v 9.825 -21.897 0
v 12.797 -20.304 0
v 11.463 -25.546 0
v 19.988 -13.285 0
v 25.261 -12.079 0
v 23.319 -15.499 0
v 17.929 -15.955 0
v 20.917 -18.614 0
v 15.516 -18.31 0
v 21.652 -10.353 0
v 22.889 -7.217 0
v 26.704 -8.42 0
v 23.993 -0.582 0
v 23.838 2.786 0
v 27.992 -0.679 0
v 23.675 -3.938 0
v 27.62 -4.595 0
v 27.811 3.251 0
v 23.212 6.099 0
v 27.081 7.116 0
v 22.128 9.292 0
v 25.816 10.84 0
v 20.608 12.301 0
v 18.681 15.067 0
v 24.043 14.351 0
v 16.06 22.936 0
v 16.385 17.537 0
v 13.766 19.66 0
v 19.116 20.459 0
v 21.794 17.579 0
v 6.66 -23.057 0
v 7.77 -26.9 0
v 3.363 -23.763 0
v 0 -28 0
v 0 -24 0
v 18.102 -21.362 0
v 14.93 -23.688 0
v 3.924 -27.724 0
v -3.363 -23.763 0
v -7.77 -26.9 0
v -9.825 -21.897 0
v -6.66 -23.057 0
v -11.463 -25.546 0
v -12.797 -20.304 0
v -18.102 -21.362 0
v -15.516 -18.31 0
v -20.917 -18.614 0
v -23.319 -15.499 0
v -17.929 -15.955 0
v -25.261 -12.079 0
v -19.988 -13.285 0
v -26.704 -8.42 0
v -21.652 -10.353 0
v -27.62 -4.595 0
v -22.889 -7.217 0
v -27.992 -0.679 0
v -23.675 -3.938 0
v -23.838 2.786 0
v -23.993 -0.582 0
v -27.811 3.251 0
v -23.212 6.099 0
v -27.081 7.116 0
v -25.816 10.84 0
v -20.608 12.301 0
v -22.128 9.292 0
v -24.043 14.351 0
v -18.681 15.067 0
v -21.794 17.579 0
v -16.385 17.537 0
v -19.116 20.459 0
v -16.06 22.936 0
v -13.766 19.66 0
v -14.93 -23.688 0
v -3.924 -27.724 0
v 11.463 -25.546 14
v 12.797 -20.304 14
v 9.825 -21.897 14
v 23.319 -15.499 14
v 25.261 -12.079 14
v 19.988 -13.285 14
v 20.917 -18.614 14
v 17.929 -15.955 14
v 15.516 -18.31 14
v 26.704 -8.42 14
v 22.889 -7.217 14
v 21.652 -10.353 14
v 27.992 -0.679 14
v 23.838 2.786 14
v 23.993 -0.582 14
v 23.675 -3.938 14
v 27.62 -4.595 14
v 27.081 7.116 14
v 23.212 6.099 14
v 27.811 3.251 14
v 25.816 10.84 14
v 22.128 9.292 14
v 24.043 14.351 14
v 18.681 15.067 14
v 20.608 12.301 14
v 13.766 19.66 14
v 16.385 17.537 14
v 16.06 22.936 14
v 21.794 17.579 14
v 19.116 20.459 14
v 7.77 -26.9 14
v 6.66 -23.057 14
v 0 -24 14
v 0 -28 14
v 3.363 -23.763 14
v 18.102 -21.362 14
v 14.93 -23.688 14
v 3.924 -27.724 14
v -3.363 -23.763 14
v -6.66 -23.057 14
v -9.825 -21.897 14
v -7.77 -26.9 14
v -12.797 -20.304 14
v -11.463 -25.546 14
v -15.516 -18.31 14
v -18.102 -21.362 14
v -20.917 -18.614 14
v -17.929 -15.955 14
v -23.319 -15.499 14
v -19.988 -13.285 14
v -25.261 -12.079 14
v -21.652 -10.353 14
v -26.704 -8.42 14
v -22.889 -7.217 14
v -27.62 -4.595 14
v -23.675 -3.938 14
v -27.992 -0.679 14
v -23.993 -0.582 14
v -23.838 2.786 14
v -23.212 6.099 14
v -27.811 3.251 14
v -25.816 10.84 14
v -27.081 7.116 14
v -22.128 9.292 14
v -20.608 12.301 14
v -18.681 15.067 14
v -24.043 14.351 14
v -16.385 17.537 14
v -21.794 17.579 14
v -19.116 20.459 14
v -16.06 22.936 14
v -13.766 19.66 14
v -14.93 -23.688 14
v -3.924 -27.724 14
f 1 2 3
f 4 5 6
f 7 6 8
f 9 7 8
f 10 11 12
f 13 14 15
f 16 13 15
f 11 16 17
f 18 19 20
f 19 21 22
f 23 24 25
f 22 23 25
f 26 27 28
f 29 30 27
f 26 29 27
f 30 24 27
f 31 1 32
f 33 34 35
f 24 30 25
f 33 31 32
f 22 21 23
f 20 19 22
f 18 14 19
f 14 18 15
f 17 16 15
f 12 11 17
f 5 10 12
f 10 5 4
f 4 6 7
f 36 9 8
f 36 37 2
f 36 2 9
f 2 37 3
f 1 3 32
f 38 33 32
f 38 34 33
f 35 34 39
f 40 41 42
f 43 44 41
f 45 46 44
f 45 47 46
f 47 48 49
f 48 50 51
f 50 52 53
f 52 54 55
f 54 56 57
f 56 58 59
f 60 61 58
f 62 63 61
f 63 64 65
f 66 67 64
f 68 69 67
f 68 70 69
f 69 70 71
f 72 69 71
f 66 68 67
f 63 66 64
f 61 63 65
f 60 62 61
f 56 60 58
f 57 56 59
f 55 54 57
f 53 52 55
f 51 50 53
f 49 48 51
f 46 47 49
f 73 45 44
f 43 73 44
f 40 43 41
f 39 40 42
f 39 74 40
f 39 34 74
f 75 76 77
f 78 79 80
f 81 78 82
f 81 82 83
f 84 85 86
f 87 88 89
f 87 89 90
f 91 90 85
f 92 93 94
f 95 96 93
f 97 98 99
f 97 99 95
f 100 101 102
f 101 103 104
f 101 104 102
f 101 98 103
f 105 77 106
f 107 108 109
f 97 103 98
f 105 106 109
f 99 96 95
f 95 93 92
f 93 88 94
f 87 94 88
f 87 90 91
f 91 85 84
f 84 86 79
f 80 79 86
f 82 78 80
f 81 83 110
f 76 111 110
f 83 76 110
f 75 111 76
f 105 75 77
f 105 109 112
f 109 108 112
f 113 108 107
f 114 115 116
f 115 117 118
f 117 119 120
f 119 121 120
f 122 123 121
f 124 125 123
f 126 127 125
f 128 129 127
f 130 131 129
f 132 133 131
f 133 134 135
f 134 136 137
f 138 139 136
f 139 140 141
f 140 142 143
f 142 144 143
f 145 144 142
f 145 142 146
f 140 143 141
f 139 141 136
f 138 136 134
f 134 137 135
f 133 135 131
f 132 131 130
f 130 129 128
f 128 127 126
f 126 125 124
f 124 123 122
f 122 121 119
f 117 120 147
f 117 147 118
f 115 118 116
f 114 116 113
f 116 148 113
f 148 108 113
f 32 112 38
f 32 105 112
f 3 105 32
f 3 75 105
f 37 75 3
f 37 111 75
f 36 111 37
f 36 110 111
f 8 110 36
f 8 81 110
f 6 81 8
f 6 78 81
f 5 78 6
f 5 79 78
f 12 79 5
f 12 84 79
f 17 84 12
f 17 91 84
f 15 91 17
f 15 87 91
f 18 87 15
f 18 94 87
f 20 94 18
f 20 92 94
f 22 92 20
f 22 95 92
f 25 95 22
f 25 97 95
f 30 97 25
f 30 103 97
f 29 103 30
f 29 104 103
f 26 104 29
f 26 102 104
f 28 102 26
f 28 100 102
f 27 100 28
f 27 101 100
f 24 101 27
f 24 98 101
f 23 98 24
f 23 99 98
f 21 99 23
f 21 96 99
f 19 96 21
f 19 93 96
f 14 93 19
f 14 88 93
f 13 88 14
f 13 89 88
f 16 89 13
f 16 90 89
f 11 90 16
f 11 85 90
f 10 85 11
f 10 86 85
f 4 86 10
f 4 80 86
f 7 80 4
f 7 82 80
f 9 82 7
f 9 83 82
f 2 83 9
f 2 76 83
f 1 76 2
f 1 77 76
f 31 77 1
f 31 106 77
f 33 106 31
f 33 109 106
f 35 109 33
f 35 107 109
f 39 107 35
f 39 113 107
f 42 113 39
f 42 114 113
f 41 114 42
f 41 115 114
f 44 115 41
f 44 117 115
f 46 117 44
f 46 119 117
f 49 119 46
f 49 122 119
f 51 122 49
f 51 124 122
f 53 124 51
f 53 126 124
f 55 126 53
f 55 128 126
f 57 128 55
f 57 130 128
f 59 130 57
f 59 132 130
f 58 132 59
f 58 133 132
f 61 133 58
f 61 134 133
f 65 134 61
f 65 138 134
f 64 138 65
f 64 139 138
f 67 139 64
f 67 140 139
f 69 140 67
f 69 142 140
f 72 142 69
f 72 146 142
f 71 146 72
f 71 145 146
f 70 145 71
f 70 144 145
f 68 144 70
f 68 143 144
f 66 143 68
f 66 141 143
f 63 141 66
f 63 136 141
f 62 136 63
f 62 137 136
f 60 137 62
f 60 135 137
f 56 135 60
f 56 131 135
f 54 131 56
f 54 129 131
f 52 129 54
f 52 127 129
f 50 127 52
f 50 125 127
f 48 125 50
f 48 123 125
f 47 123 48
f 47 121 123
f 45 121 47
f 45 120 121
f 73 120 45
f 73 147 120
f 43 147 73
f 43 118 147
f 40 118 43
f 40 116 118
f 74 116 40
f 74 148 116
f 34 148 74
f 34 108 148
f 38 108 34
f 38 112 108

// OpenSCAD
$fn = 32;

// ----------------------------------------------------------------------
// Spring clip: 56 mm outside, 4 mm band, 70 degree opening
// ----------------------------------------------------------------------

// --- parameters (mm) ---
outer_r = 28;             // clip outside radius
inner_r = 24;             // clip bore radius
band = 4;                 // band thickness
clip_w = 14;              // clip width
opening = 70;             // opening angle

clip_profile = [[-16.06, 22.936], [-19.116, 20.459], [-21.794, 17.579], [-24.043, 14.351], [-25.816, 10.84], [-27.081, 7.116], [-27.811, 3.251], [-27.992, -0.679], [-27.62, -4.595], [-26.704, -8.42], [-25.261, -12.079], [-23.319, -15.499], [-20.917, -18.614], [-18.102, -21.362], [-14.93, -23.688], [-11.463, -25.546], [-7.77, -26.9], [-3.924, -27.724], [0, -28], [3.924, -27.724], [7.77, -26.9], [11.463, -25.546], [14.93, -23.688], [18.102, -21.362], [20.917, -18.614], [23.319, -15.499], [25.261, -12.079], [26.704, -8.42], [27.62, -4.595], [27.992, -0.679], [27.811, 3.251], [27.081, 7.116], [25.816, 10.84], [24.043, 14.351], [21.794, 17.579], [19.116, 20.459], [16.06, 22.936], [13.766, 19.66], [16.385, 17.537], [18.681, 15.067], [20.608, 12.301], [22.128, 9.292], [23.212, 6.099], [23.838, 2.786], [23.993, -0.582], [23.675, -3.938], [22.889, -7.217], [21.652, -10.353], [19.988, -13.285], [17.929, -15.955], [15.516, -18.31], [12.797, -20.304], [9.825, -21.897], [6.66, -23.057], [3.363, -23.763], [0, -24], [-3.363, -23.763], [-6.66, -23.057], [-9.825, -21.897], [-12.797, -20.304], [-15.516, -18.31], [-17.929, -15.955], [-19.988, -13.285], [-21.652, -10.353], [-22.889, -7.217], [-23.675, -3.938], [-23.993, -0.582], [-23.838, 2.786], [-23.212, 6.099], [-22.128, 9.292], [-20.608, 12.301], [-18.681, 15.067], [-16.385, 17.537], [-13.766, 19.66]];

difference() {
  union() {
    linear_extrude(height = clip_w) polygon(clip_profile);
  }
}
